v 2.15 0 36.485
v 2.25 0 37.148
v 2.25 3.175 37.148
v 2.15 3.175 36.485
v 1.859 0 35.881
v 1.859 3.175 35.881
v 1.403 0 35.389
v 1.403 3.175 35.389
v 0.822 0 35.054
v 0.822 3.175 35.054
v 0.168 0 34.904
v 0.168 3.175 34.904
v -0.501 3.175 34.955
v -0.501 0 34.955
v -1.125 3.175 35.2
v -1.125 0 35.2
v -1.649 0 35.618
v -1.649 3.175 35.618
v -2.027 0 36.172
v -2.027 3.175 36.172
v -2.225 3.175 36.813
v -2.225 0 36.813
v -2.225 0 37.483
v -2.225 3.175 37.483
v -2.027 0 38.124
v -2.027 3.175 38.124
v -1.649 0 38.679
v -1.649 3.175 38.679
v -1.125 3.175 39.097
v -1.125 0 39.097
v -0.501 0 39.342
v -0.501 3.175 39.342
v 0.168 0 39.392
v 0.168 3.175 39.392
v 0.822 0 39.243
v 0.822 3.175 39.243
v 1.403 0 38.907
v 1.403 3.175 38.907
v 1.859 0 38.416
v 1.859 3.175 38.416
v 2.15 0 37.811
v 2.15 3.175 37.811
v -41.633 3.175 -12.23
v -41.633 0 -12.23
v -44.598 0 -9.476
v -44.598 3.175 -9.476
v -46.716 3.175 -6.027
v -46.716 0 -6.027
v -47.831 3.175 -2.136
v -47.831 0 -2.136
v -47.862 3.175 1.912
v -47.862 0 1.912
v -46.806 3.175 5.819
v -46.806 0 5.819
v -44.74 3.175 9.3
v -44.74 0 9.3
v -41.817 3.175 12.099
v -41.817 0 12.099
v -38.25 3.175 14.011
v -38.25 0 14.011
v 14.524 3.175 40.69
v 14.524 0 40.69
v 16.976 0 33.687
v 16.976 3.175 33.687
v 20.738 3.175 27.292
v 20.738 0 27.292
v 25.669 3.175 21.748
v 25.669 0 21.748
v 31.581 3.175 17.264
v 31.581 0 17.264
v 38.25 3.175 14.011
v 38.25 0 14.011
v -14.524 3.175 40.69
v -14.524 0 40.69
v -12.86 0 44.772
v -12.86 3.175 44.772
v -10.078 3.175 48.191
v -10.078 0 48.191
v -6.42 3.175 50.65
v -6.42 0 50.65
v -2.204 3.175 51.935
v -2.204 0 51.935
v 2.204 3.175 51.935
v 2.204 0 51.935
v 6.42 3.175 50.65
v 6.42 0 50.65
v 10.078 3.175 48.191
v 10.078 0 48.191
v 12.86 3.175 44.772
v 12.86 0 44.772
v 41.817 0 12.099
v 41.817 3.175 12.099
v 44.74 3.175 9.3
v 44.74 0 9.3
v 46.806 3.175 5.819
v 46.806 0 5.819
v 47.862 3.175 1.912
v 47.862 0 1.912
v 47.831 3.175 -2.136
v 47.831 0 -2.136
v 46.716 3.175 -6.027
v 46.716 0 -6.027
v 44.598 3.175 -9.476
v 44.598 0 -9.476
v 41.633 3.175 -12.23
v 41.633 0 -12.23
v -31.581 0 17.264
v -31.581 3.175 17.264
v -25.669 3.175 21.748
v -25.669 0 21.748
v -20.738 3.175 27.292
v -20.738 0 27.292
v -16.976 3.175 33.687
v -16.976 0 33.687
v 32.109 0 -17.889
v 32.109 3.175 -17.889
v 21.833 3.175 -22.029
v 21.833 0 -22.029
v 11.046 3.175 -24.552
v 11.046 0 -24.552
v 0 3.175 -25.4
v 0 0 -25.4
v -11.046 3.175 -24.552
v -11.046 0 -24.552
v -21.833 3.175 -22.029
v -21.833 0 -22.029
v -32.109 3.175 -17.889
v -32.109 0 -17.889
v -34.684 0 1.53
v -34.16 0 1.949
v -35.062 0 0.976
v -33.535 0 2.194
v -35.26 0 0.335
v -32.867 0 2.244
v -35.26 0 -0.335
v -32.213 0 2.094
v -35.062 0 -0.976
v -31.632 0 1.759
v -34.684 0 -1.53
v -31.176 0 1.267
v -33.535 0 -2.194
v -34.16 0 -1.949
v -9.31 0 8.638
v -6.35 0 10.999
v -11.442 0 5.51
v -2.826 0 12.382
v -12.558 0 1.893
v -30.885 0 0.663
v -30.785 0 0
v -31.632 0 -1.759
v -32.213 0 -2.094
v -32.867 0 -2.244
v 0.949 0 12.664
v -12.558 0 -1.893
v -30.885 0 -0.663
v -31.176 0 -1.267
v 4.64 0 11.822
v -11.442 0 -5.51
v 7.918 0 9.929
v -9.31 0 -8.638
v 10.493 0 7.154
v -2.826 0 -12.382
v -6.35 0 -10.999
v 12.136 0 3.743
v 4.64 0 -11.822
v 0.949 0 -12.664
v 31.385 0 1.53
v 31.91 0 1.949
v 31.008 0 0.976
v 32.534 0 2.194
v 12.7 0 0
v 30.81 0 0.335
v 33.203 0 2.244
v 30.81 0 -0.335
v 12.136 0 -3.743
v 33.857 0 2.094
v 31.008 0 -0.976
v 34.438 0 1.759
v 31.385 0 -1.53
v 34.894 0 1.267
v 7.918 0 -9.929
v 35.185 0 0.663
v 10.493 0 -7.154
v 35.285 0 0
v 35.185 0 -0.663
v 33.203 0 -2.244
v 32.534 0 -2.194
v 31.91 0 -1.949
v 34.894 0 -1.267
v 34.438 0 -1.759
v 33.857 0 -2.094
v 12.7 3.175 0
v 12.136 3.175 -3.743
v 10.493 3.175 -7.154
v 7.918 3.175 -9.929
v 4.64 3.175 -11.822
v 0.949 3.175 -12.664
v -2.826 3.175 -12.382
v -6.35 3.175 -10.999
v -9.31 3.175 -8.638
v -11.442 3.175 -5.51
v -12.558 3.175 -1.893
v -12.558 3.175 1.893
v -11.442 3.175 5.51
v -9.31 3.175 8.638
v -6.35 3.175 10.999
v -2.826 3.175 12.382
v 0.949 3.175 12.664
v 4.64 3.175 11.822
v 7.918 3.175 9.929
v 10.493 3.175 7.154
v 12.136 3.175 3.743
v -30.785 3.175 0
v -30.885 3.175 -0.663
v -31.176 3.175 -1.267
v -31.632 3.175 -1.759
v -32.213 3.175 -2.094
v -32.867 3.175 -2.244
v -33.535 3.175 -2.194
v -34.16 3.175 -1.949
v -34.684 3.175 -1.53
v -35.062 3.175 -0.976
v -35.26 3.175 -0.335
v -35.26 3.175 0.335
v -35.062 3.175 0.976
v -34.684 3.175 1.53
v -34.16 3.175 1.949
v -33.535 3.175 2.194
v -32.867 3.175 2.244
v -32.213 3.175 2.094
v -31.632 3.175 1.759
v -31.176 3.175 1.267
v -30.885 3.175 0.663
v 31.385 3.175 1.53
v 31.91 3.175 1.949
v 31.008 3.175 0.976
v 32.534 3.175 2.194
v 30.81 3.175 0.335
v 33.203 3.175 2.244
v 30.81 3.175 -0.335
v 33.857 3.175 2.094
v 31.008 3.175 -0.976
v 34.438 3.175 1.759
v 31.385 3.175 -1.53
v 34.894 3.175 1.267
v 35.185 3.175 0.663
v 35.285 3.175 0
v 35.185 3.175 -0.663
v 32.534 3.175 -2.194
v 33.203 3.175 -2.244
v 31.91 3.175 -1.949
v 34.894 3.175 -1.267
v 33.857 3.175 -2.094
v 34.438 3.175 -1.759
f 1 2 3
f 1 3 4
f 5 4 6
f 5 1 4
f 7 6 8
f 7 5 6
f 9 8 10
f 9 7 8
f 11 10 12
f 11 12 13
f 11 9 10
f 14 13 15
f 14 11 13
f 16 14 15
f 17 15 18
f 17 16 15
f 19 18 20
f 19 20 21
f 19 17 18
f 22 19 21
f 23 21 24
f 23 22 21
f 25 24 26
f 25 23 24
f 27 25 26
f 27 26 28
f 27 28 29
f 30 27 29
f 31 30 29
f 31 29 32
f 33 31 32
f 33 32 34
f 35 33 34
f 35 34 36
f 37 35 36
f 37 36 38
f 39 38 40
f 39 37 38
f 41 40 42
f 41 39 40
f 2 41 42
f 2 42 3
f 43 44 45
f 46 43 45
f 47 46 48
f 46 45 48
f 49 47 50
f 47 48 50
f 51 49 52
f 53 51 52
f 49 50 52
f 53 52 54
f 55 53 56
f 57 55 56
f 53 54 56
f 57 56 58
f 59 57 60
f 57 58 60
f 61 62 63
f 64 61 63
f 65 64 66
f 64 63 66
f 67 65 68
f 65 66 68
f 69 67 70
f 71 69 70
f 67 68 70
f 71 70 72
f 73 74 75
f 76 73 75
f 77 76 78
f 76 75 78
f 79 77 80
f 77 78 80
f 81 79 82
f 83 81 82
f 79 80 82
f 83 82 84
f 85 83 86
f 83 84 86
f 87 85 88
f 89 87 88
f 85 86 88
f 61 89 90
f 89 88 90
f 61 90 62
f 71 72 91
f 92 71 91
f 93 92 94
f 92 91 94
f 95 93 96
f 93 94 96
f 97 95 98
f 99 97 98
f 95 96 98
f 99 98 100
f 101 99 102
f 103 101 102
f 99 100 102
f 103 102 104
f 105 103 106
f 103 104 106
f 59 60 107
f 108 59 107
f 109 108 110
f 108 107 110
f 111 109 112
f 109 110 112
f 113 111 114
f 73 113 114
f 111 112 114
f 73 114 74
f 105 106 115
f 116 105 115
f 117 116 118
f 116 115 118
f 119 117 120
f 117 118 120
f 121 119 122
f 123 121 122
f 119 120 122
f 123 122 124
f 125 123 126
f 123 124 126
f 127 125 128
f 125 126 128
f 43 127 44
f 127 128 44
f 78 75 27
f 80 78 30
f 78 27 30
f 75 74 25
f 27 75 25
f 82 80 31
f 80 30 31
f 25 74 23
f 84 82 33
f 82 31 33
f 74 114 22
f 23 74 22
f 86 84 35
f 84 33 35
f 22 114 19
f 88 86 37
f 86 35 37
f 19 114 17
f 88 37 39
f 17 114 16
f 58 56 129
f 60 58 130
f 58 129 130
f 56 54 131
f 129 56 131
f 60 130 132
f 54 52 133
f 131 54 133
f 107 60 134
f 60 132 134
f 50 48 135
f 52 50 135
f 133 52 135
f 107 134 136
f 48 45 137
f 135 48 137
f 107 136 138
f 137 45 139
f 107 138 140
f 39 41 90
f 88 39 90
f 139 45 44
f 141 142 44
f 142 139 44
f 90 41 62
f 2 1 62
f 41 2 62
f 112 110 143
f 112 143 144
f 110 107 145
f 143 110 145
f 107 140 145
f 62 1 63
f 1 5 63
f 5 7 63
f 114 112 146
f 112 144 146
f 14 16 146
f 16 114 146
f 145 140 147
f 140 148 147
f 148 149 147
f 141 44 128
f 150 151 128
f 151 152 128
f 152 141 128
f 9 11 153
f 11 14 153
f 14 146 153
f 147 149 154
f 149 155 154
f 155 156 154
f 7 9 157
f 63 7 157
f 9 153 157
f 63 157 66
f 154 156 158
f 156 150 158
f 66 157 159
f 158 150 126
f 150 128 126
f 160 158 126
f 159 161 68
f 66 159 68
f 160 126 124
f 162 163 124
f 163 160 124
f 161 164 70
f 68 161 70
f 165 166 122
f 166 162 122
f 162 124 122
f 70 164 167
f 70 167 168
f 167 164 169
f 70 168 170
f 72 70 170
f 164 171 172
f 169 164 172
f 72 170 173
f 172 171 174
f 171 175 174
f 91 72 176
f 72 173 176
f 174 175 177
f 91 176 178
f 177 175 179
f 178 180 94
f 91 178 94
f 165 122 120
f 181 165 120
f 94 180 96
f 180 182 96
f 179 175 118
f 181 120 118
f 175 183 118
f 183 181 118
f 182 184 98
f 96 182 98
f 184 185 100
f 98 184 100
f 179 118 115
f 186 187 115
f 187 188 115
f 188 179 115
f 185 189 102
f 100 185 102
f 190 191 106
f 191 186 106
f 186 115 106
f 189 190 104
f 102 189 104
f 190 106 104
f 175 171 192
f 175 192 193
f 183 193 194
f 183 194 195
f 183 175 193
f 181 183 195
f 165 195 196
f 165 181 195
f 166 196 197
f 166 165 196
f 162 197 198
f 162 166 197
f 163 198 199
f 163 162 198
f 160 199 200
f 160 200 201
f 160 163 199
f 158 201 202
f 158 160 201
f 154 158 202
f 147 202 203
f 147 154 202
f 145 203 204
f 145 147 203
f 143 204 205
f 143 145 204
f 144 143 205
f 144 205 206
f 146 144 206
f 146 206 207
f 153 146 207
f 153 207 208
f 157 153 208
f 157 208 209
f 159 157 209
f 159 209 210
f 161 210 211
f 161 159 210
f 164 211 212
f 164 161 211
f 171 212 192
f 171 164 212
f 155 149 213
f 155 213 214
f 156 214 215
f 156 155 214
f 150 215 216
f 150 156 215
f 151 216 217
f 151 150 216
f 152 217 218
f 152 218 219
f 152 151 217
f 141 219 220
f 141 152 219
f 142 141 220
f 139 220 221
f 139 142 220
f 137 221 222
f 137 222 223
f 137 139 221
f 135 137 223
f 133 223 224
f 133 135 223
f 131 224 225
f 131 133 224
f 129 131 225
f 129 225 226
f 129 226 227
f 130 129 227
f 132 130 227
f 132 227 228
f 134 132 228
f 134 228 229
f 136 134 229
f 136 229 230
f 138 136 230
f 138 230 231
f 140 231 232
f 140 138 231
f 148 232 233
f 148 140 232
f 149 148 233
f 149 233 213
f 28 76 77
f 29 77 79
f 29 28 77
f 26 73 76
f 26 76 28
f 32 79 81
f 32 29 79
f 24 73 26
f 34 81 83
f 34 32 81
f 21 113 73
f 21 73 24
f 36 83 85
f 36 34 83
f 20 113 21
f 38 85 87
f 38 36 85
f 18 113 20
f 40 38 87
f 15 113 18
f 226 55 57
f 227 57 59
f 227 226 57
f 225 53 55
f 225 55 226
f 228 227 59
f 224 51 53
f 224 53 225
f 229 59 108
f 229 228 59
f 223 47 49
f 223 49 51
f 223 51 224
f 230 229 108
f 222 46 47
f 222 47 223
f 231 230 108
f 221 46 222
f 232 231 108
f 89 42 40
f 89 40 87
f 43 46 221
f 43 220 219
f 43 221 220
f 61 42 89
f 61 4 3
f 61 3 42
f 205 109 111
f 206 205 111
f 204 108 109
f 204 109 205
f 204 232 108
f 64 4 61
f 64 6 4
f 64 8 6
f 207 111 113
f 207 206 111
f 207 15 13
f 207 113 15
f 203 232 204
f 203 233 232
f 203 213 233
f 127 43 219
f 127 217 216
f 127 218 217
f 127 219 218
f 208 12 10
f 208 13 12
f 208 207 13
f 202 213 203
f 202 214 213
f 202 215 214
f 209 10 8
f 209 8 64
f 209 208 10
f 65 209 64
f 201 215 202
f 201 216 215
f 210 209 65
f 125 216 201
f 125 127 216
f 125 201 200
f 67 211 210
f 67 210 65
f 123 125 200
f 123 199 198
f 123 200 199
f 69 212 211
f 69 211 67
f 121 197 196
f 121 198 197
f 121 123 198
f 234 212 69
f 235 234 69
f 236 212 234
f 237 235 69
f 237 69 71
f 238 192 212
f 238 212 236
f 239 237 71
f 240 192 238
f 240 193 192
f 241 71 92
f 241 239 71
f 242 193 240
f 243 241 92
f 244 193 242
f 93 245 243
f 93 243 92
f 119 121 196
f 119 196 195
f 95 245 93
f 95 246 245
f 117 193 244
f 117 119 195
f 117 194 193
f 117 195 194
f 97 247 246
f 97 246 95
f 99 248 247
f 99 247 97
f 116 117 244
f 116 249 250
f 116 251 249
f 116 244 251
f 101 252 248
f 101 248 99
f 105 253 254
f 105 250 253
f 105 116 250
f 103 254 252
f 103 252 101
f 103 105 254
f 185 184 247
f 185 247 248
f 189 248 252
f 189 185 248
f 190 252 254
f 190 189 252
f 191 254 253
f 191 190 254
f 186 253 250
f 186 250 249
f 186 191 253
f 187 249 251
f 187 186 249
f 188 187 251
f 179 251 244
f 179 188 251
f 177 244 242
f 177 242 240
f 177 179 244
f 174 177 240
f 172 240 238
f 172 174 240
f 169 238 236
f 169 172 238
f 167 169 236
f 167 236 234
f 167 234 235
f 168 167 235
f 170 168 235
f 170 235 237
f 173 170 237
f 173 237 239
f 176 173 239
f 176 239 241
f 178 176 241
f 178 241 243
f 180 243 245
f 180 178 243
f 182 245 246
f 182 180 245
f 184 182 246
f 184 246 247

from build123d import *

# Parameters (mm, degrees)
SKETCH1_R           = 12.7
SKETCH1_R_2         = 2.25
BOSS_EXTRUDE1_DEPTH = 3.175


with BuildPart() as part:
    # Sketch1 → Boss-Extrude1 (new body)
    with BuildSketch(Plane(origin=(0, 0, 0), x_dir=(1, 0, 0), z_dir=(0, 1, 0))):
        with BuildLine():
            ThreePointArc((-41.632787539, 12.230172128), (-47.862074133, -1.911659432), (-38.249546762, -14.011028378))
            ThreePointArc((-38.249546762, -14.011028378), (-23.068421331, -24.399712606), (-14.524270984, -40.690471465))
            ThreePointArc((-14.524270984, -40.690471465), (0, -52.098148446), (14.524270984, -40.690471465))
            ThreePointArc((14.524270984, -40.690471465), (23.068421331, -24.399712606), (38.249546762, -14.011028378))
            ThreePointArc((38.249546762, -14.011028378), (47.862074133, -1.911659432), (41.632787539, 12.230172128))
            ThreePointArc((41.632787539, 12.230172128), (0, 25.4), (-41.632787539, 12.230172128))
        make_face()
        Circle(SKETCH1_R, mode=Mode.SUBTRACT)
        with Locations((-33.0348, 0)):
            Circle(SKETCH1_R_2, mode=Mode.SUBTRACT)
        with Locations((33.0348, 0)):
            Circle(SKETCH1_R_2, mode=Mode.SUBTRACT)
        with Locations((0, -37.148148446)):
            Circle(SKETCH1_R_2, mode=Mode.SUBTRACT)
    extrude(amount=BOSS_EXTRUDE1_DEPTH)


solid = part.part
